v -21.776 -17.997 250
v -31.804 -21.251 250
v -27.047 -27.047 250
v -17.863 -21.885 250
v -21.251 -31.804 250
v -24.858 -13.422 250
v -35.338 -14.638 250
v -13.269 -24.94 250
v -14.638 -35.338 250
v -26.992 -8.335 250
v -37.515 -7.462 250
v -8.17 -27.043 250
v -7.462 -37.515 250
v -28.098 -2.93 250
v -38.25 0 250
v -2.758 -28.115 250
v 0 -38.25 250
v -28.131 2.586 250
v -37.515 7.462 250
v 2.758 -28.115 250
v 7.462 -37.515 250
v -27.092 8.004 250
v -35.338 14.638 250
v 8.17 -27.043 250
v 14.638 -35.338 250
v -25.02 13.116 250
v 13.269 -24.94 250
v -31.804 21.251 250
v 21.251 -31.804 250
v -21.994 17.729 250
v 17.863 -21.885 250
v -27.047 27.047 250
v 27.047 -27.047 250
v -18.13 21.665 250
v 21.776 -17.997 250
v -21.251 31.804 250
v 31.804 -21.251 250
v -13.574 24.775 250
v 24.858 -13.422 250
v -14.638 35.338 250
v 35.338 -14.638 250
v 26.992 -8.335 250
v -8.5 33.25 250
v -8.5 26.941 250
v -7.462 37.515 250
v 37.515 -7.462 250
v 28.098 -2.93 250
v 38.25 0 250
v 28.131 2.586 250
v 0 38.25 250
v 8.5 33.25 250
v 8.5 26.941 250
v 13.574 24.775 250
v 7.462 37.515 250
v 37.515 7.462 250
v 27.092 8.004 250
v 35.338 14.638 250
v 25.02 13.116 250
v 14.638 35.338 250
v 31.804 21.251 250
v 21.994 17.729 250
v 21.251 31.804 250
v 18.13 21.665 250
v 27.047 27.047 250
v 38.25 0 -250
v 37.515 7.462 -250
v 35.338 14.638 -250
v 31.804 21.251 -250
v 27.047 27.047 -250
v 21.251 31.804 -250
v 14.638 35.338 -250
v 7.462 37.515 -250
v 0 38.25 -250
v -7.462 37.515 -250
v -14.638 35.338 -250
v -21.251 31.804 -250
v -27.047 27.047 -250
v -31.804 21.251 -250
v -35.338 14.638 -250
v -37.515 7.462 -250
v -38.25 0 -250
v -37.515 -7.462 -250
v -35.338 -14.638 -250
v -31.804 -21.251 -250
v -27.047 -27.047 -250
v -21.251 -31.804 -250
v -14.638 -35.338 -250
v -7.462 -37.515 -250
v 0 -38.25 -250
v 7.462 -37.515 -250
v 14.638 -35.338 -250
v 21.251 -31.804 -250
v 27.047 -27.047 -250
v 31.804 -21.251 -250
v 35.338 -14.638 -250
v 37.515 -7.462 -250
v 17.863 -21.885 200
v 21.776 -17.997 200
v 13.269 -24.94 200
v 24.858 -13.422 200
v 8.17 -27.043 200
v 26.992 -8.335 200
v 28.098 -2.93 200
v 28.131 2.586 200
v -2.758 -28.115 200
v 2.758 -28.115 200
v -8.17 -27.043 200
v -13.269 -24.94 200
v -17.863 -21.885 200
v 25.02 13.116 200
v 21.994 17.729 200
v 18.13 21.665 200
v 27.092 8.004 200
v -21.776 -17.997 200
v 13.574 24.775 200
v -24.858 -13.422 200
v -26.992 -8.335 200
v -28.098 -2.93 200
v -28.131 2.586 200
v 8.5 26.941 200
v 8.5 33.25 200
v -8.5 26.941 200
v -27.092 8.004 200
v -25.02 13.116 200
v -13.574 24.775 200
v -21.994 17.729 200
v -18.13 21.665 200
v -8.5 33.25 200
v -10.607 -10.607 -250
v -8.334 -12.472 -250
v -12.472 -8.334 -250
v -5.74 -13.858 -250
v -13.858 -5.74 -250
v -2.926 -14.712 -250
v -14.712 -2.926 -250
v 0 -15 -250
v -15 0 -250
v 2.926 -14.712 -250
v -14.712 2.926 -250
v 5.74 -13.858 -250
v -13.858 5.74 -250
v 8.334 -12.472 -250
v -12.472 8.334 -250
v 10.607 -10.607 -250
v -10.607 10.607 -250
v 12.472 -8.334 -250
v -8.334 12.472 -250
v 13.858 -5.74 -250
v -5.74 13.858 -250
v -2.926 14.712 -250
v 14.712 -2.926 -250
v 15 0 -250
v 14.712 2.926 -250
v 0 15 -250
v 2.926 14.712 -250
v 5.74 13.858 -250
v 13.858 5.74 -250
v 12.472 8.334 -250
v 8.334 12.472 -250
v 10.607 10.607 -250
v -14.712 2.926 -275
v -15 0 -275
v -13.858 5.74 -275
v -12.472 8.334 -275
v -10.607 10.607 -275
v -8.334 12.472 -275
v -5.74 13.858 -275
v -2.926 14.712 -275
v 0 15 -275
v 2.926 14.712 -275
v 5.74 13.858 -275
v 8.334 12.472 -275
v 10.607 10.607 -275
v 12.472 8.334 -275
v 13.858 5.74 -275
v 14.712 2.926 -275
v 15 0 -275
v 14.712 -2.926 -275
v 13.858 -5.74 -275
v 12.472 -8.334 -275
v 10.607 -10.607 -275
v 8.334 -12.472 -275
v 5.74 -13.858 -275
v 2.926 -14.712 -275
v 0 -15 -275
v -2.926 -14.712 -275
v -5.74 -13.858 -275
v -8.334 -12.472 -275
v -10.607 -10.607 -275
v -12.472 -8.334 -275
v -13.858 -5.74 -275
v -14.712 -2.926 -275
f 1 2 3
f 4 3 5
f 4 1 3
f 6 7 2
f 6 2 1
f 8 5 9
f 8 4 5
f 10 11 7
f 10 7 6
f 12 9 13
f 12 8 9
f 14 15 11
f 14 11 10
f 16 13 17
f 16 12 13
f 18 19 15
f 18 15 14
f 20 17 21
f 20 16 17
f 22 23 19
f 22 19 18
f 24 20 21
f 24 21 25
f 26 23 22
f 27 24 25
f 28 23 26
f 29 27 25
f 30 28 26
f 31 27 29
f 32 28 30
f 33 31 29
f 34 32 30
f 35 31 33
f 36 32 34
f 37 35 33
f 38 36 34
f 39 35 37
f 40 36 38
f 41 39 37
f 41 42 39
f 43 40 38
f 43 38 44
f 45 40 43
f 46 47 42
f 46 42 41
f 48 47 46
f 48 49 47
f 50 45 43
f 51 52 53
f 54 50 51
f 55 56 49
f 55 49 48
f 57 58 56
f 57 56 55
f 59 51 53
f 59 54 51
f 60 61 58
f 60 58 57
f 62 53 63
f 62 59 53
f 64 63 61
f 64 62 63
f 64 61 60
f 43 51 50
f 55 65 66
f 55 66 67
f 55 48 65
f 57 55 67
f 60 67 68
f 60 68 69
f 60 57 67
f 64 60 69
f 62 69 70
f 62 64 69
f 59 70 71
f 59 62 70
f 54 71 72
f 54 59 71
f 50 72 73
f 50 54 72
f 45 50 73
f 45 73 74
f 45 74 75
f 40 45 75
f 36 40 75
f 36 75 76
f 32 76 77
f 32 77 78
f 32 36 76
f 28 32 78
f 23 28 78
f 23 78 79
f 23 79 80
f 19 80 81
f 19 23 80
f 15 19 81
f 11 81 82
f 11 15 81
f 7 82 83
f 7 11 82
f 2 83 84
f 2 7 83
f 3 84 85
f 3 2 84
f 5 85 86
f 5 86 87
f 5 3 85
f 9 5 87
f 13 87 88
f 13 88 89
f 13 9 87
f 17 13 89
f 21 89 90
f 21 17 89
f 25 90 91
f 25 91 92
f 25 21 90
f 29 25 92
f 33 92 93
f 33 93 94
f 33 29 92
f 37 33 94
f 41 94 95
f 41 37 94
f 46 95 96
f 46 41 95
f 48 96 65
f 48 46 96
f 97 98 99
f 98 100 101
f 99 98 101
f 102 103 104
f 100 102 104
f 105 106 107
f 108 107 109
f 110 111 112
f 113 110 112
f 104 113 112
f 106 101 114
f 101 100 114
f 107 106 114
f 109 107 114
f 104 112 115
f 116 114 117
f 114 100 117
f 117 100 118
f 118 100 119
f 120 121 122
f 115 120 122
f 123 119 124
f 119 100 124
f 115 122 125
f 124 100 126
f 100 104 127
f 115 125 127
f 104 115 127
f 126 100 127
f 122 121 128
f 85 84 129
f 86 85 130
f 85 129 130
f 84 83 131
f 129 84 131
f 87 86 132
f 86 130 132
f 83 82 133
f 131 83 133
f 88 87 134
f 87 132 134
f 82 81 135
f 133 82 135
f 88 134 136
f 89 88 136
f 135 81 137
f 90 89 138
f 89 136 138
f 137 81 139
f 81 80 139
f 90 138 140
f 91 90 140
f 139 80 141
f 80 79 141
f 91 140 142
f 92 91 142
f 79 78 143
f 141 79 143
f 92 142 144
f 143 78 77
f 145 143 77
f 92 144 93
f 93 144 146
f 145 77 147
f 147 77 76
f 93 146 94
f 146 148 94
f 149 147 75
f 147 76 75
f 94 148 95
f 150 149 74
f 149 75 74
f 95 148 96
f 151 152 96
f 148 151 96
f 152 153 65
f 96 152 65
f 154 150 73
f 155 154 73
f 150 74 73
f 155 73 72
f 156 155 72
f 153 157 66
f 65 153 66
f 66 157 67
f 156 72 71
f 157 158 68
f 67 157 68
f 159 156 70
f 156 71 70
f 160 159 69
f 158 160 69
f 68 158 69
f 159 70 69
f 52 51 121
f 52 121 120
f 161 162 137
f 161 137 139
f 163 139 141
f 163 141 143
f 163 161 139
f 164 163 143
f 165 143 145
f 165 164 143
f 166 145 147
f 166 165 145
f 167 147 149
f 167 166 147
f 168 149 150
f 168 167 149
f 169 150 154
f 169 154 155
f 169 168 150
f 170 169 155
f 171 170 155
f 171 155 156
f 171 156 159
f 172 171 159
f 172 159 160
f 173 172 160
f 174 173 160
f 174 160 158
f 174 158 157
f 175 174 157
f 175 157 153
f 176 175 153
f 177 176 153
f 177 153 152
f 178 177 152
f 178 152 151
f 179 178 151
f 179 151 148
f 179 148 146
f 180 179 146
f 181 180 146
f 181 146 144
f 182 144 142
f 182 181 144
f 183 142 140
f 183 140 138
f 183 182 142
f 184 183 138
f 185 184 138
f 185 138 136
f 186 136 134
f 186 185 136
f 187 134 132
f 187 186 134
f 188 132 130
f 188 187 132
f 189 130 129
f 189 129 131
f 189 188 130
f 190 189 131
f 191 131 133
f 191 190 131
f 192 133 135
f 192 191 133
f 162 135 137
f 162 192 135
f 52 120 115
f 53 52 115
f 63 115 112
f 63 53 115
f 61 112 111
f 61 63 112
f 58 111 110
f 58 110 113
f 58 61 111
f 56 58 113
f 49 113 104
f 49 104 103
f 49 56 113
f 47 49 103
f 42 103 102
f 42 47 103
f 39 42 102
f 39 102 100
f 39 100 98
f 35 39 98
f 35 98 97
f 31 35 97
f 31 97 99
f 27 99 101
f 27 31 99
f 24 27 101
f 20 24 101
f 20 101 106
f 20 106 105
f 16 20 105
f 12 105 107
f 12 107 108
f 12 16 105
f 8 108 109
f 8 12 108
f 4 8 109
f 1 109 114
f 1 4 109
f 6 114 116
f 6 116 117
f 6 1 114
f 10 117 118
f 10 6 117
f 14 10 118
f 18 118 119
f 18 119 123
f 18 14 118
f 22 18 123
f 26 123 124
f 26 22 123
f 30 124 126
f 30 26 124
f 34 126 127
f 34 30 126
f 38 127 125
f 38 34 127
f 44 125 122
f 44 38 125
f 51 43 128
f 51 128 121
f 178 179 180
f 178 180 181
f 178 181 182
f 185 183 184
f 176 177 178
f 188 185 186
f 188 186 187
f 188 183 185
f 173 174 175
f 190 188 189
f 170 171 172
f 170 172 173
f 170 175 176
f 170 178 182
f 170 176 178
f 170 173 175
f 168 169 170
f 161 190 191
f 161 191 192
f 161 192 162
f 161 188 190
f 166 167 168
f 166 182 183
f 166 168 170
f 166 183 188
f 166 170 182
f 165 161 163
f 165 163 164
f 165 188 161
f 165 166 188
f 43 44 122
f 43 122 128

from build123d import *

# Parameters (mm, degrees)
SKETCH1_R           = 38.25
BOSS_EXTRUDE1_DEPTH = 250
CUT_EXTRUDE2_DEPTH  = 50
SKETCH4_R           = 35
SKETCH4_R_2         = 15
BOSS_EXTRUDE2_DEPTH = 50
BOSS_EXTRUDE3_START = 75
SKETCH5_R           = 15
BOSS_EXTRUDE3_DEPTH = 75


with BuildPart() as part:
    # Sketch1 → Boss-Extrude1 (new body)
    with BuildSketch(Plane.XY):
        Circle(SKETCH1_R)
    boss_extrude1 = extrude(amount=BOSS_EXTRUDE1_DEPTH)

    # Sketch3 → Cut-Extrude2 (cut)
    with BuildSketch(Plane.XY.offset(250)):
        with BuildLine():
            Line((-8.5, 26.940907557), (-8.5, 33.25))
            Line((-8.5, 33.25), (8.5, 33.25))
            Line((8.5, 33.25), (8.5, 26.940907557))
            ThreePointArc((8.5, 26.940907557), (0, -28.25), (-8.5, 26.940907557))
        make_face()
    cut_extrude2 = extrude(amount=-CUT_EXTRUDE2_DEPTH, mode=Mode.SUBTRACT)

    # Mirror1: Boss-Extrude1, Cut-Extrude2 across plane
    add(boss_extrude1.mirror(Plane.XY))
    add(cut_extrude2.mirror(Plane.XY), mode=Mode.SUBTRACT)

    # Sketch4 → Boss-Extrude2 (add)
    with BuildSketch(Plane(origin=(0, 0, -250), x_dir=(-1, 0, 0), z_dir=(0, 0, -1))):
        Circle(SKETCH4_R)
        Circle(SKETCH4_R_2, mode=Mode.SUBTRACT)
    extrude(amount=-BOSS_EXTRUDE2_DEPTH)

    # Sketch5 → Boss-Extrude3 (add)
    with BuildSketch(Plane(origin=(0, 0, -200), x_dir=(-1, 0, 0), z_dir=(0, 0, -1)).offset(BOSS_EXTRUDE3_START)):
        Circle(SKETCH5_R)
    extrude(amount=-BOSS_EXTRUDE3_DEPTH)


solid = part.part
